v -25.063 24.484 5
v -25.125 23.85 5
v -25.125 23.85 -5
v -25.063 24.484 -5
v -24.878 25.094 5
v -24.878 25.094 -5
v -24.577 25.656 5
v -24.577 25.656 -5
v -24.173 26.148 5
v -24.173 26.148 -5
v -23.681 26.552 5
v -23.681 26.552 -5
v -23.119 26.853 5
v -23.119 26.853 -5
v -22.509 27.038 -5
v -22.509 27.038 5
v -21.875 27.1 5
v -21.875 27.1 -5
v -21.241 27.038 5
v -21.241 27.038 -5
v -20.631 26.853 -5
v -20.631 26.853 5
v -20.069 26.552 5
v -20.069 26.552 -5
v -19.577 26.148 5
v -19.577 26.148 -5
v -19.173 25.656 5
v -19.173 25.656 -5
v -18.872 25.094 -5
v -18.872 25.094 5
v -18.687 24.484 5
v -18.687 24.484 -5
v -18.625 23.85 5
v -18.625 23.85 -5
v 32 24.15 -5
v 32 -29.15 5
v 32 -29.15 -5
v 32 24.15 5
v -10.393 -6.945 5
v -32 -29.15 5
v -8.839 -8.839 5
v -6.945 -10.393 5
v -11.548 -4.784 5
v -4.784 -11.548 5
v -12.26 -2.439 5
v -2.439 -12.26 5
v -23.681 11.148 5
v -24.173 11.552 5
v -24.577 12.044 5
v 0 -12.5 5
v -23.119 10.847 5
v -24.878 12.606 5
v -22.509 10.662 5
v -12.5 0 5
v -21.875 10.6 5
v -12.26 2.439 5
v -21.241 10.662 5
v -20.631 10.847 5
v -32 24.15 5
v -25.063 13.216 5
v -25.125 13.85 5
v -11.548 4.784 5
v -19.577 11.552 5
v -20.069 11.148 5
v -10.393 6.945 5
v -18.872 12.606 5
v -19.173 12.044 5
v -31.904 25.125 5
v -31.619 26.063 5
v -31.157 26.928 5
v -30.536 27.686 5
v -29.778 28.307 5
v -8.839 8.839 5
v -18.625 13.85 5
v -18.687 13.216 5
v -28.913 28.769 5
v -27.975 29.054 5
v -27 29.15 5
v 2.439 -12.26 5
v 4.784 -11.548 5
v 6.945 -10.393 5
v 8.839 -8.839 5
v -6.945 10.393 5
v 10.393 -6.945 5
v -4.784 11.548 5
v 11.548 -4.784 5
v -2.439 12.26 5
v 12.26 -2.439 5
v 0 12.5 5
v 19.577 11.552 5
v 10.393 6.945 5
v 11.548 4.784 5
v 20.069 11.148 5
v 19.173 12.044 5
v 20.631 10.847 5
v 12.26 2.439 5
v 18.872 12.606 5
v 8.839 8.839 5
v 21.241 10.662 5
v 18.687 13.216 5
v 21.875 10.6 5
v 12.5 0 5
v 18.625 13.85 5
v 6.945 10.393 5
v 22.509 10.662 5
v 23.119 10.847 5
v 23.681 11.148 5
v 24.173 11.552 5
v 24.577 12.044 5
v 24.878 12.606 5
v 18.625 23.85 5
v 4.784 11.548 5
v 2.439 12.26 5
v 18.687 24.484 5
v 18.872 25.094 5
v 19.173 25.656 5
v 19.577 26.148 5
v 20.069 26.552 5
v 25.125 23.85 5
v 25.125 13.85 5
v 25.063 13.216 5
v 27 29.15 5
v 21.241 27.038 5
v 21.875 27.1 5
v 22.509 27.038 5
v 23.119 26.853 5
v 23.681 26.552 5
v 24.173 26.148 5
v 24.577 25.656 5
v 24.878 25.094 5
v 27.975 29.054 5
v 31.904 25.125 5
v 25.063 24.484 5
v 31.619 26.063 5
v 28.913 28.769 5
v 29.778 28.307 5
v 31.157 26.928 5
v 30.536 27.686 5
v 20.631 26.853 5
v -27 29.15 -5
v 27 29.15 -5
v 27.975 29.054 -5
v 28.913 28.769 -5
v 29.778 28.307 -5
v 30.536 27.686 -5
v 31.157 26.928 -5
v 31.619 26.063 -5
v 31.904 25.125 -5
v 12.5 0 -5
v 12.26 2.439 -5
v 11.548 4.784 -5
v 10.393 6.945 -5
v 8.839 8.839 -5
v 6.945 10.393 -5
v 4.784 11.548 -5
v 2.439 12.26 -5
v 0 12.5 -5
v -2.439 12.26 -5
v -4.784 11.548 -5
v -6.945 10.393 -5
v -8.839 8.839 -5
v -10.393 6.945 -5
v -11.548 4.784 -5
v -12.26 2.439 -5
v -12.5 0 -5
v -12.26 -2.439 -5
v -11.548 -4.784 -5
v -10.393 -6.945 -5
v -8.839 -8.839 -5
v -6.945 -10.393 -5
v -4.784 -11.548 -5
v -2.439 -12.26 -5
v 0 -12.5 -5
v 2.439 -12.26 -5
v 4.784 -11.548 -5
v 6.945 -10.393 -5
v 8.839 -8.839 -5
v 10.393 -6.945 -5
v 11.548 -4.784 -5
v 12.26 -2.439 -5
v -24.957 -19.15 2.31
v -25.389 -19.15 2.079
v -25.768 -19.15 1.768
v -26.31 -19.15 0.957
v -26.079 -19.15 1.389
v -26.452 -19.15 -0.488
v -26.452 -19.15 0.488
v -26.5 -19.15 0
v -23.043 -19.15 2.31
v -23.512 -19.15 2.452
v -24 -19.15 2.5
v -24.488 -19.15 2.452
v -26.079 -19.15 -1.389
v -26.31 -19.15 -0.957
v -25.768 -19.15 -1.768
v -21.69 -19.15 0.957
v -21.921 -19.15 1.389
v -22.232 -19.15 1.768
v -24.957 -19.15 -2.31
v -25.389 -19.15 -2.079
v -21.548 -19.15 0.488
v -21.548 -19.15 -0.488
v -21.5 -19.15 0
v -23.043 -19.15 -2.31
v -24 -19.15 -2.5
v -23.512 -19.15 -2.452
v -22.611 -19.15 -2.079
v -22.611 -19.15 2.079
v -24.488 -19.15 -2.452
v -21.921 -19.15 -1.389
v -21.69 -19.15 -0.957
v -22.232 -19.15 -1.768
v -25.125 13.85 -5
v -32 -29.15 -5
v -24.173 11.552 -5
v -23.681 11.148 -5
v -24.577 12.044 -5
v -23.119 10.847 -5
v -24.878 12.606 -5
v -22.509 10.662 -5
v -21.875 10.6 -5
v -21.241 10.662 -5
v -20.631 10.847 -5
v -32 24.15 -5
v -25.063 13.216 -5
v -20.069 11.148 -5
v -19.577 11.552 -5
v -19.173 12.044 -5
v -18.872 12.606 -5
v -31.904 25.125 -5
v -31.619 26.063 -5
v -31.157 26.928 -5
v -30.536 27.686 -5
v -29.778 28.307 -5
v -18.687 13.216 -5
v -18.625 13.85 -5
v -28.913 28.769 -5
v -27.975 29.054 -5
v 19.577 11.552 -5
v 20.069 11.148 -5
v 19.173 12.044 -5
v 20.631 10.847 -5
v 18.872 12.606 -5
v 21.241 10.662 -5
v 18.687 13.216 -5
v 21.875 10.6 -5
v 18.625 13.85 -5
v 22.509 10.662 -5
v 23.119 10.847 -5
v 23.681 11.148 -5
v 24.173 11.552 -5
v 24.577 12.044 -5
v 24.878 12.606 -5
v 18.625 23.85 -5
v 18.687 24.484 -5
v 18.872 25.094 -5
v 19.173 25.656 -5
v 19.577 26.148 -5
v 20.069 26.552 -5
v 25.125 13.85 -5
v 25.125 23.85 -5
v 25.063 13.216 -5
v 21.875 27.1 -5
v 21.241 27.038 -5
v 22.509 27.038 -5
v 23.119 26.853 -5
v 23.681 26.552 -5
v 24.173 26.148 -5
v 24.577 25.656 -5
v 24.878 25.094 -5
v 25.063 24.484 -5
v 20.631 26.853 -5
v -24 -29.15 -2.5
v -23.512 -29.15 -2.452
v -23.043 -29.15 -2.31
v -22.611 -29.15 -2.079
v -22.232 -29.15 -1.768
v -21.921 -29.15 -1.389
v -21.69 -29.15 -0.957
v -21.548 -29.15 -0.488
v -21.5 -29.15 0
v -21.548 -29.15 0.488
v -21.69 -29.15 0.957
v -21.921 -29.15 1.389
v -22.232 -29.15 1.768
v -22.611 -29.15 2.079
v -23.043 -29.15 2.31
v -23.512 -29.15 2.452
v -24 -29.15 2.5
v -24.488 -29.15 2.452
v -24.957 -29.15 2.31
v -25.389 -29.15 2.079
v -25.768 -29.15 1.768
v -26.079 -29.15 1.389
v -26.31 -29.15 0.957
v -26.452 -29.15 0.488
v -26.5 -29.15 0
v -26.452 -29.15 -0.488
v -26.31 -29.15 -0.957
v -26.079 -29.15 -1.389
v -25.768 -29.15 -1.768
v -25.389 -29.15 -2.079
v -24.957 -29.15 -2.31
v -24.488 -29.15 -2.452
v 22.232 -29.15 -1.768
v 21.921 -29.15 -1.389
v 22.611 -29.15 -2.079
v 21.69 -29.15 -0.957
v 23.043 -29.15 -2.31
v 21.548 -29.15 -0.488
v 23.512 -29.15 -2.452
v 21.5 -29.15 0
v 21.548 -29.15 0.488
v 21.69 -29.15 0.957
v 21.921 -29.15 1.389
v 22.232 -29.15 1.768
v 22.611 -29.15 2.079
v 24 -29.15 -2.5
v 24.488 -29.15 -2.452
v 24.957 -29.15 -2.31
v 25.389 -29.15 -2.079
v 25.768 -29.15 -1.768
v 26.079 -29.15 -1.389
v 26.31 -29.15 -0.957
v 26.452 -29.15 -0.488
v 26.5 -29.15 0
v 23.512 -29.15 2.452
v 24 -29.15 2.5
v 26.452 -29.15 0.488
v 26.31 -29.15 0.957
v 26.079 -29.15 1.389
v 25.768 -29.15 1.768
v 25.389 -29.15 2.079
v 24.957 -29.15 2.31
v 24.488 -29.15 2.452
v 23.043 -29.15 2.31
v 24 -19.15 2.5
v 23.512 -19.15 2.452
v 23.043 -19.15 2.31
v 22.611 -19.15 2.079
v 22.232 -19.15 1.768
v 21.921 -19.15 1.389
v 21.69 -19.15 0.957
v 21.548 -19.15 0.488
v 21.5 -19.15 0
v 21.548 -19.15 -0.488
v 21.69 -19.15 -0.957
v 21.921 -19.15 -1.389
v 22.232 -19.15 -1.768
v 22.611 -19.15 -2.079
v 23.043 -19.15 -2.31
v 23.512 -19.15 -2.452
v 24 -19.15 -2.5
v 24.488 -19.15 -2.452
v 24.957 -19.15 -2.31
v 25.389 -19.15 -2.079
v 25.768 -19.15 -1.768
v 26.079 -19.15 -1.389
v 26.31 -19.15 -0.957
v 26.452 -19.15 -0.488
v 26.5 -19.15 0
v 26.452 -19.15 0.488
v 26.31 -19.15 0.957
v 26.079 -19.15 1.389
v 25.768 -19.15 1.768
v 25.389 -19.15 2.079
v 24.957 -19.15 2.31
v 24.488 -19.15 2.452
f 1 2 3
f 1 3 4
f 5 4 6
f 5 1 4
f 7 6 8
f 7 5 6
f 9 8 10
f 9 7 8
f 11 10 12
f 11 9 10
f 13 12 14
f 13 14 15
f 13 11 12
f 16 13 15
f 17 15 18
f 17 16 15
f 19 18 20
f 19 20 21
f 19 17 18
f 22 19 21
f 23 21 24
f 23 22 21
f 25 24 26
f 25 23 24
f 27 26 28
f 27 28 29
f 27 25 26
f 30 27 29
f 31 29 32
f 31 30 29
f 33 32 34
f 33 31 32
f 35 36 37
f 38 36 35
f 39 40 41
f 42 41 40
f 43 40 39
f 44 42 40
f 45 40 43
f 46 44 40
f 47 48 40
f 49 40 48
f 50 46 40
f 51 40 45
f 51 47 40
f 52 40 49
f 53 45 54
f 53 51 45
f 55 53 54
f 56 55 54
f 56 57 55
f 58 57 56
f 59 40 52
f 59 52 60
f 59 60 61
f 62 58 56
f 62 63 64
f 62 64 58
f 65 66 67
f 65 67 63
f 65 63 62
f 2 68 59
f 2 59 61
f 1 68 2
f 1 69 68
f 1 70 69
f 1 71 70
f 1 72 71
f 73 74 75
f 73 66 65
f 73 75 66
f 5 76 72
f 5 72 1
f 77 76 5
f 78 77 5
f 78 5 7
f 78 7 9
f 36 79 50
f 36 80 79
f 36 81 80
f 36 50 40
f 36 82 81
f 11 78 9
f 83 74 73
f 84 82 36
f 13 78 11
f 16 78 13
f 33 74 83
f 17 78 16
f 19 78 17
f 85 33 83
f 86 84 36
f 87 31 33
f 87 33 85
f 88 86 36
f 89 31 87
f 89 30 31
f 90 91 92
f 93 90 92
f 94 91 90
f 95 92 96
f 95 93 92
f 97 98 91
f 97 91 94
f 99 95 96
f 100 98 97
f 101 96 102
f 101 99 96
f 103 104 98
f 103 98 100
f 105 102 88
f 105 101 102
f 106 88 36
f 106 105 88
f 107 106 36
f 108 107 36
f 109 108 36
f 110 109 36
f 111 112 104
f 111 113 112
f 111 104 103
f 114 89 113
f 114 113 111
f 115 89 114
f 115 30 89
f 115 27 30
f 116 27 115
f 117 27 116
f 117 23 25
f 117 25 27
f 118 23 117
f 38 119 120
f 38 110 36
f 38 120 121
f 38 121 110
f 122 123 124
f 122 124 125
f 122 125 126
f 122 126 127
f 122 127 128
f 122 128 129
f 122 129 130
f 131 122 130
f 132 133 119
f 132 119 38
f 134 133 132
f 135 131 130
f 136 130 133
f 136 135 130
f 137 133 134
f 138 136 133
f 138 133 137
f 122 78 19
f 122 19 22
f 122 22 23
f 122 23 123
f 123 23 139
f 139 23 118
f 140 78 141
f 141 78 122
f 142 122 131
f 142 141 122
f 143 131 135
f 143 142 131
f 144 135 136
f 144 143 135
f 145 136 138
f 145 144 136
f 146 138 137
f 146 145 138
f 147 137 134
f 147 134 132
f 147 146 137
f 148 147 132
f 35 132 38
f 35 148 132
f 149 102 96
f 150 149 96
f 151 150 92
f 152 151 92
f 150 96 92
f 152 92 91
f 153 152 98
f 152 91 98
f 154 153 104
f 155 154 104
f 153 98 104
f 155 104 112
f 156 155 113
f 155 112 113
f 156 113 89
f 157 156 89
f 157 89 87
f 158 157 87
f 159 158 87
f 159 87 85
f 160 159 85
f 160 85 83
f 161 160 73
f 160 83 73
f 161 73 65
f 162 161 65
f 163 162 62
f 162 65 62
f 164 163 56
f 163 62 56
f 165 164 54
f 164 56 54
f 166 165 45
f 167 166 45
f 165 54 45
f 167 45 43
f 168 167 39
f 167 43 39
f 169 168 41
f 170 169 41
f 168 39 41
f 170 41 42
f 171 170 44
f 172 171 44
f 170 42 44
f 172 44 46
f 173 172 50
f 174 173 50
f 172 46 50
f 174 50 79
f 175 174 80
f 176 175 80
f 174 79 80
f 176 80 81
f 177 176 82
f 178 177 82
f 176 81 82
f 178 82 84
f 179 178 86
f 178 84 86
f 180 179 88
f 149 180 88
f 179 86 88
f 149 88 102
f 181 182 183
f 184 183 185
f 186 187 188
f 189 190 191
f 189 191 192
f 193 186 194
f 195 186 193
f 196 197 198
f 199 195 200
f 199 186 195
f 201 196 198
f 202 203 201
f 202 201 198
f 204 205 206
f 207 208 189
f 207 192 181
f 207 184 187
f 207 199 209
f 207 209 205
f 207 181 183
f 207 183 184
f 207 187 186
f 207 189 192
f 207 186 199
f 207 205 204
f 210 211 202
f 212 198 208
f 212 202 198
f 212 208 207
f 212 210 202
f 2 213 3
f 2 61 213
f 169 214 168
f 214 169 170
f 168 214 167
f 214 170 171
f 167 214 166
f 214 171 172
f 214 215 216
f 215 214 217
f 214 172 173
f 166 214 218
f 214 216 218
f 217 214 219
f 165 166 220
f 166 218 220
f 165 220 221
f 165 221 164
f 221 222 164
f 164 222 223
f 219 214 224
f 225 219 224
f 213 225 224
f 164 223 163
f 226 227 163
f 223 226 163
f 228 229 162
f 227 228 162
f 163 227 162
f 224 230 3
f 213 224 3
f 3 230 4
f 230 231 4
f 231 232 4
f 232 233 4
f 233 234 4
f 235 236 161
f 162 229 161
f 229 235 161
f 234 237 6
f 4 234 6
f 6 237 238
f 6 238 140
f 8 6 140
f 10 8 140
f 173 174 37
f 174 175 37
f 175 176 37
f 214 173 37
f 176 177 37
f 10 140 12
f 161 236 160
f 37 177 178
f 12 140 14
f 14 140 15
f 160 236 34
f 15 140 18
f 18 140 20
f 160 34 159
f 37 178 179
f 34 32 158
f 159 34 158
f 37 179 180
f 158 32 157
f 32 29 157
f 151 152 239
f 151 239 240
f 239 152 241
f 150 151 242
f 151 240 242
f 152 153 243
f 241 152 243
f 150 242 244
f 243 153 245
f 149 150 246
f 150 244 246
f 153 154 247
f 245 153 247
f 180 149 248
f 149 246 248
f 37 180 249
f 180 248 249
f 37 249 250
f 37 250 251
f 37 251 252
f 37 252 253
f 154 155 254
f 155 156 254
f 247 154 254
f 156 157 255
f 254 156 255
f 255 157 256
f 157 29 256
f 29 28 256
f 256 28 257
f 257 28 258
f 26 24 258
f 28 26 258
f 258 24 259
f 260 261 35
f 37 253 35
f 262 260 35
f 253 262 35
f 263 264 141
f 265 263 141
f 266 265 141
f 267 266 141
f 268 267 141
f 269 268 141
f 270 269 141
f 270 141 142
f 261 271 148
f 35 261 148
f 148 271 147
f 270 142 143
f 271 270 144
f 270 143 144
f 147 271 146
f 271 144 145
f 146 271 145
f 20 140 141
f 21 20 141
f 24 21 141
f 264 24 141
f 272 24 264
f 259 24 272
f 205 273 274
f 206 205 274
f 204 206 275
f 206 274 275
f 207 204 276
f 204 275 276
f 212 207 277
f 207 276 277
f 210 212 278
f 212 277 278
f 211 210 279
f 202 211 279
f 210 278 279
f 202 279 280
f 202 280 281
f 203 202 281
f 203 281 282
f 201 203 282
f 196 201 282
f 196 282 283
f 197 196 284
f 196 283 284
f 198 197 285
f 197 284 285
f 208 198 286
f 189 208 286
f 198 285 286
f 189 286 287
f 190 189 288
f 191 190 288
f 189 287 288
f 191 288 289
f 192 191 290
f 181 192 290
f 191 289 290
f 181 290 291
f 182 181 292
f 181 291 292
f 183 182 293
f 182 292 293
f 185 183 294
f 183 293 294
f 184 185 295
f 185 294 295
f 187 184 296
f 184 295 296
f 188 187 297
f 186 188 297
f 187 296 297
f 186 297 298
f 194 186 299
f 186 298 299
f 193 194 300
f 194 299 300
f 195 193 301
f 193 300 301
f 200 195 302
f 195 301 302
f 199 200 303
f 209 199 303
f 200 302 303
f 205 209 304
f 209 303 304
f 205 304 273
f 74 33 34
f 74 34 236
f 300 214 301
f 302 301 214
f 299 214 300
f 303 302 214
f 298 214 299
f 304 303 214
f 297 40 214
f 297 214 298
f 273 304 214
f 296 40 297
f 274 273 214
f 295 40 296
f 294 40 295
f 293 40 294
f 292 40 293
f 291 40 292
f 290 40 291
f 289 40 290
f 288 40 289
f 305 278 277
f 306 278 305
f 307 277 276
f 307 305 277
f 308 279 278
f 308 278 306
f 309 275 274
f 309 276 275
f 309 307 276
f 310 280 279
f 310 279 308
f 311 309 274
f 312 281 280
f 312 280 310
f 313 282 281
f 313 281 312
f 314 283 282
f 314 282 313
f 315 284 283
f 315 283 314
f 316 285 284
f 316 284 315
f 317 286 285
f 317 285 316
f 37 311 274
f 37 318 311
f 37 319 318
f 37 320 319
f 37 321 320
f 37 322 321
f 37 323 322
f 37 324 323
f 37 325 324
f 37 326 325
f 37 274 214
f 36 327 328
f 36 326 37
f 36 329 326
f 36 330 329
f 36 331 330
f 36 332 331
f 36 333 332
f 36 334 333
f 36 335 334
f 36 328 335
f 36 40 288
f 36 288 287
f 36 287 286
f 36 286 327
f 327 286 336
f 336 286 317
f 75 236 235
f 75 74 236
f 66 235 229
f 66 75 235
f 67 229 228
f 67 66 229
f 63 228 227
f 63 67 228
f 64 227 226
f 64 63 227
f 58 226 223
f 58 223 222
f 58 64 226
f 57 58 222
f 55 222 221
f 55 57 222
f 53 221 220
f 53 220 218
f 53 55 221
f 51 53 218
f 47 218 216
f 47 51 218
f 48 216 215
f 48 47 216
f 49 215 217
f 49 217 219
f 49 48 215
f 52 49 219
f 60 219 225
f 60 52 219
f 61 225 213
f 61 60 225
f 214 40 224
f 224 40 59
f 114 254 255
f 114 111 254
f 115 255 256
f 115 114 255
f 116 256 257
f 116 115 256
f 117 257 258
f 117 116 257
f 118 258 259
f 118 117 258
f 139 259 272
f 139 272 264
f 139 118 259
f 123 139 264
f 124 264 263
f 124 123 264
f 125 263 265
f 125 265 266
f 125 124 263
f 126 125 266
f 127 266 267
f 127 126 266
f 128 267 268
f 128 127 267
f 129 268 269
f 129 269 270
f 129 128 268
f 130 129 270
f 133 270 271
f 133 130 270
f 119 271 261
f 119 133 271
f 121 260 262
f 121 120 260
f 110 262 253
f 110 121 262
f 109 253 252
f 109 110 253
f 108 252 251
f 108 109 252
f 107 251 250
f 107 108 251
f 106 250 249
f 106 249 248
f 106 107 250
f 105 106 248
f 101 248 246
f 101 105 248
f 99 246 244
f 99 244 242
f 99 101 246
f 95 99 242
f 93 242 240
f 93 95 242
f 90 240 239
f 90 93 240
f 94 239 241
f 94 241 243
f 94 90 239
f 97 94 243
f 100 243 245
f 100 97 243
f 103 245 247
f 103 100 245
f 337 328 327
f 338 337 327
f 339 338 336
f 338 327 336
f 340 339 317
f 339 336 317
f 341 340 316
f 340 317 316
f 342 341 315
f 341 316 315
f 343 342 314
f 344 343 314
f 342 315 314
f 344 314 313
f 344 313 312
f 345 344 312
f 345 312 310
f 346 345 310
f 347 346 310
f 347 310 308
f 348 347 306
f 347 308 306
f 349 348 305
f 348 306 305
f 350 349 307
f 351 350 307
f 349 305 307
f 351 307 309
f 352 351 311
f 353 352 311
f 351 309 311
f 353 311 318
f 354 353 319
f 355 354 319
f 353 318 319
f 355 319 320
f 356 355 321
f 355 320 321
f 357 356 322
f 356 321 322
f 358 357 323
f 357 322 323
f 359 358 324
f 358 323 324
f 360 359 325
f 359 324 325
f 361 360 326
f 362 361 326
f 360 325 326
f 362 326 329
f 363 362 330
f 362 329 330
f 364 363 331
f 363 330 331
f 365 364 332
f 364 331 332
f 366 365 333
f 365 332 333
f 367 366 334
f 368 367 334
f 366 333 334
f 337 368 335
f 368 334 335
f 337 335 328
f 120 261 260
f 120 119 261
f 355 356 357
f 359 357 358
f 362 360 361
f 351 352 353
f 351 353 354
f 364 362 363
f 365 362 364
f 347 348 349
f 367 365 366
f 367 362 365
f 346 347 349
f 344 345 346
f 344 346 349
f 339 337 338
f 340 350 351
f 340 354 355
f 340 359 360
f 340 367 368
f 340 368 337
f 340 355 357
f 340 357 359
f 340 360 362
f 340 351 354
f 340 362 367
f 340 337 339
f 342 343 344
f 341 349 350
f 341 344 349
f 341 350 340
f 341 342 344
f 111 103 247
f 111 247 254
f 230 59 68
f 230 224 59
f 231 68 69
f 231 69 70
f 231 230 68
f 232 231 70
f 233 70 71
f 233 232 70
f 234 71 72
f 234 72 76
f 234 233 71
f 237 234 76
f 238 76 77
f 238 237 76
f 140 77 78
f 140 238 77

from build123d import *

# Parameters (mm, degrees)
SKETCH2_W           = 64
SKETCH2_H           = 58.3
BOSS_EXTRUDE1_DEPTH = 5
SKETCH3_R           = 2.5
CUT_EXTRUDE1_DEPTH  = 10
FILLET1_R           = 5
SKETCH4_R           = 12.5
CUT_EXTRUDE2_DEPTH  = 10


with BuildPart() as part:
    # Sketch2 → Boss-Extrude1 (new, symmetric)
    with BuildSketch(Plane.XY):
        Rectangle(SKETCH2_W, SKETCH2_H)
        with BuildLine():
            ThreePointArc((-25.125, 23.85), (-21.875, 27.1), (-18.625, 23.85))
            Line((-18.625, 23.85), (-18.625, 13.85))
            ThreePointArc((-18.625, 13.85), (-21.875, 10.6), (-25.125, 13.85))
            Line((-25.125, 13.85), (-25.125, 23.85))
        make_face(mode=Mode.SUBTRACT)
        with BuildLine():
            Line((18.625, 13.85), (18.625, 23.85))
            ThreePointArc((18.625, 23.85), (21.875, 27.1), (25.125, 23.85))
            Line((25.125, 23.85), (25.125, 13.85))
            ThreePointArc((25.125, 13.85), (21.875, 10.6), (18.625, 13.85))
        make_face(mode=Mode.SUBTRACT)
    extrude(amount=BOSS_EXTRUDE1_DEPTH, both=True)

    # Sketch3 → Cut-Extrude1 (cut)
    with BuildSketch(Plane.XZ.offset(29.15)):
        with Locations(Location((-24, 0, 0), (0, 0, 270))):
            Circle(SKETCH3_R)
        with Locations(Location((24, 0, 0), (0, 0, 90))):
            Circle(SKETCH3_R)
    extrude(amount=-CUT_EXTRUDE1_DEPTH, mode=Mode.SUBTRACT)

    # Fillet1
    fillet1_edges = [part.edges().sort_by_distance(p)[0] for p in [
        (-32, 29.15, 0),
        (32, 29.15, 0),
    ]]
    fillet(fillet1_edges, radius=FILLET1_R)

    # Sketch4 → Cut-Extrude2 (cut)
    with BuildSketch(Plane.XY.offset(5)):
        Circle(SKETCH4_R)
    extrude(amount=-CUT_EXTRUDE2_DEPTH, mode=Mode.SUBTRACT)


solid = part.part
